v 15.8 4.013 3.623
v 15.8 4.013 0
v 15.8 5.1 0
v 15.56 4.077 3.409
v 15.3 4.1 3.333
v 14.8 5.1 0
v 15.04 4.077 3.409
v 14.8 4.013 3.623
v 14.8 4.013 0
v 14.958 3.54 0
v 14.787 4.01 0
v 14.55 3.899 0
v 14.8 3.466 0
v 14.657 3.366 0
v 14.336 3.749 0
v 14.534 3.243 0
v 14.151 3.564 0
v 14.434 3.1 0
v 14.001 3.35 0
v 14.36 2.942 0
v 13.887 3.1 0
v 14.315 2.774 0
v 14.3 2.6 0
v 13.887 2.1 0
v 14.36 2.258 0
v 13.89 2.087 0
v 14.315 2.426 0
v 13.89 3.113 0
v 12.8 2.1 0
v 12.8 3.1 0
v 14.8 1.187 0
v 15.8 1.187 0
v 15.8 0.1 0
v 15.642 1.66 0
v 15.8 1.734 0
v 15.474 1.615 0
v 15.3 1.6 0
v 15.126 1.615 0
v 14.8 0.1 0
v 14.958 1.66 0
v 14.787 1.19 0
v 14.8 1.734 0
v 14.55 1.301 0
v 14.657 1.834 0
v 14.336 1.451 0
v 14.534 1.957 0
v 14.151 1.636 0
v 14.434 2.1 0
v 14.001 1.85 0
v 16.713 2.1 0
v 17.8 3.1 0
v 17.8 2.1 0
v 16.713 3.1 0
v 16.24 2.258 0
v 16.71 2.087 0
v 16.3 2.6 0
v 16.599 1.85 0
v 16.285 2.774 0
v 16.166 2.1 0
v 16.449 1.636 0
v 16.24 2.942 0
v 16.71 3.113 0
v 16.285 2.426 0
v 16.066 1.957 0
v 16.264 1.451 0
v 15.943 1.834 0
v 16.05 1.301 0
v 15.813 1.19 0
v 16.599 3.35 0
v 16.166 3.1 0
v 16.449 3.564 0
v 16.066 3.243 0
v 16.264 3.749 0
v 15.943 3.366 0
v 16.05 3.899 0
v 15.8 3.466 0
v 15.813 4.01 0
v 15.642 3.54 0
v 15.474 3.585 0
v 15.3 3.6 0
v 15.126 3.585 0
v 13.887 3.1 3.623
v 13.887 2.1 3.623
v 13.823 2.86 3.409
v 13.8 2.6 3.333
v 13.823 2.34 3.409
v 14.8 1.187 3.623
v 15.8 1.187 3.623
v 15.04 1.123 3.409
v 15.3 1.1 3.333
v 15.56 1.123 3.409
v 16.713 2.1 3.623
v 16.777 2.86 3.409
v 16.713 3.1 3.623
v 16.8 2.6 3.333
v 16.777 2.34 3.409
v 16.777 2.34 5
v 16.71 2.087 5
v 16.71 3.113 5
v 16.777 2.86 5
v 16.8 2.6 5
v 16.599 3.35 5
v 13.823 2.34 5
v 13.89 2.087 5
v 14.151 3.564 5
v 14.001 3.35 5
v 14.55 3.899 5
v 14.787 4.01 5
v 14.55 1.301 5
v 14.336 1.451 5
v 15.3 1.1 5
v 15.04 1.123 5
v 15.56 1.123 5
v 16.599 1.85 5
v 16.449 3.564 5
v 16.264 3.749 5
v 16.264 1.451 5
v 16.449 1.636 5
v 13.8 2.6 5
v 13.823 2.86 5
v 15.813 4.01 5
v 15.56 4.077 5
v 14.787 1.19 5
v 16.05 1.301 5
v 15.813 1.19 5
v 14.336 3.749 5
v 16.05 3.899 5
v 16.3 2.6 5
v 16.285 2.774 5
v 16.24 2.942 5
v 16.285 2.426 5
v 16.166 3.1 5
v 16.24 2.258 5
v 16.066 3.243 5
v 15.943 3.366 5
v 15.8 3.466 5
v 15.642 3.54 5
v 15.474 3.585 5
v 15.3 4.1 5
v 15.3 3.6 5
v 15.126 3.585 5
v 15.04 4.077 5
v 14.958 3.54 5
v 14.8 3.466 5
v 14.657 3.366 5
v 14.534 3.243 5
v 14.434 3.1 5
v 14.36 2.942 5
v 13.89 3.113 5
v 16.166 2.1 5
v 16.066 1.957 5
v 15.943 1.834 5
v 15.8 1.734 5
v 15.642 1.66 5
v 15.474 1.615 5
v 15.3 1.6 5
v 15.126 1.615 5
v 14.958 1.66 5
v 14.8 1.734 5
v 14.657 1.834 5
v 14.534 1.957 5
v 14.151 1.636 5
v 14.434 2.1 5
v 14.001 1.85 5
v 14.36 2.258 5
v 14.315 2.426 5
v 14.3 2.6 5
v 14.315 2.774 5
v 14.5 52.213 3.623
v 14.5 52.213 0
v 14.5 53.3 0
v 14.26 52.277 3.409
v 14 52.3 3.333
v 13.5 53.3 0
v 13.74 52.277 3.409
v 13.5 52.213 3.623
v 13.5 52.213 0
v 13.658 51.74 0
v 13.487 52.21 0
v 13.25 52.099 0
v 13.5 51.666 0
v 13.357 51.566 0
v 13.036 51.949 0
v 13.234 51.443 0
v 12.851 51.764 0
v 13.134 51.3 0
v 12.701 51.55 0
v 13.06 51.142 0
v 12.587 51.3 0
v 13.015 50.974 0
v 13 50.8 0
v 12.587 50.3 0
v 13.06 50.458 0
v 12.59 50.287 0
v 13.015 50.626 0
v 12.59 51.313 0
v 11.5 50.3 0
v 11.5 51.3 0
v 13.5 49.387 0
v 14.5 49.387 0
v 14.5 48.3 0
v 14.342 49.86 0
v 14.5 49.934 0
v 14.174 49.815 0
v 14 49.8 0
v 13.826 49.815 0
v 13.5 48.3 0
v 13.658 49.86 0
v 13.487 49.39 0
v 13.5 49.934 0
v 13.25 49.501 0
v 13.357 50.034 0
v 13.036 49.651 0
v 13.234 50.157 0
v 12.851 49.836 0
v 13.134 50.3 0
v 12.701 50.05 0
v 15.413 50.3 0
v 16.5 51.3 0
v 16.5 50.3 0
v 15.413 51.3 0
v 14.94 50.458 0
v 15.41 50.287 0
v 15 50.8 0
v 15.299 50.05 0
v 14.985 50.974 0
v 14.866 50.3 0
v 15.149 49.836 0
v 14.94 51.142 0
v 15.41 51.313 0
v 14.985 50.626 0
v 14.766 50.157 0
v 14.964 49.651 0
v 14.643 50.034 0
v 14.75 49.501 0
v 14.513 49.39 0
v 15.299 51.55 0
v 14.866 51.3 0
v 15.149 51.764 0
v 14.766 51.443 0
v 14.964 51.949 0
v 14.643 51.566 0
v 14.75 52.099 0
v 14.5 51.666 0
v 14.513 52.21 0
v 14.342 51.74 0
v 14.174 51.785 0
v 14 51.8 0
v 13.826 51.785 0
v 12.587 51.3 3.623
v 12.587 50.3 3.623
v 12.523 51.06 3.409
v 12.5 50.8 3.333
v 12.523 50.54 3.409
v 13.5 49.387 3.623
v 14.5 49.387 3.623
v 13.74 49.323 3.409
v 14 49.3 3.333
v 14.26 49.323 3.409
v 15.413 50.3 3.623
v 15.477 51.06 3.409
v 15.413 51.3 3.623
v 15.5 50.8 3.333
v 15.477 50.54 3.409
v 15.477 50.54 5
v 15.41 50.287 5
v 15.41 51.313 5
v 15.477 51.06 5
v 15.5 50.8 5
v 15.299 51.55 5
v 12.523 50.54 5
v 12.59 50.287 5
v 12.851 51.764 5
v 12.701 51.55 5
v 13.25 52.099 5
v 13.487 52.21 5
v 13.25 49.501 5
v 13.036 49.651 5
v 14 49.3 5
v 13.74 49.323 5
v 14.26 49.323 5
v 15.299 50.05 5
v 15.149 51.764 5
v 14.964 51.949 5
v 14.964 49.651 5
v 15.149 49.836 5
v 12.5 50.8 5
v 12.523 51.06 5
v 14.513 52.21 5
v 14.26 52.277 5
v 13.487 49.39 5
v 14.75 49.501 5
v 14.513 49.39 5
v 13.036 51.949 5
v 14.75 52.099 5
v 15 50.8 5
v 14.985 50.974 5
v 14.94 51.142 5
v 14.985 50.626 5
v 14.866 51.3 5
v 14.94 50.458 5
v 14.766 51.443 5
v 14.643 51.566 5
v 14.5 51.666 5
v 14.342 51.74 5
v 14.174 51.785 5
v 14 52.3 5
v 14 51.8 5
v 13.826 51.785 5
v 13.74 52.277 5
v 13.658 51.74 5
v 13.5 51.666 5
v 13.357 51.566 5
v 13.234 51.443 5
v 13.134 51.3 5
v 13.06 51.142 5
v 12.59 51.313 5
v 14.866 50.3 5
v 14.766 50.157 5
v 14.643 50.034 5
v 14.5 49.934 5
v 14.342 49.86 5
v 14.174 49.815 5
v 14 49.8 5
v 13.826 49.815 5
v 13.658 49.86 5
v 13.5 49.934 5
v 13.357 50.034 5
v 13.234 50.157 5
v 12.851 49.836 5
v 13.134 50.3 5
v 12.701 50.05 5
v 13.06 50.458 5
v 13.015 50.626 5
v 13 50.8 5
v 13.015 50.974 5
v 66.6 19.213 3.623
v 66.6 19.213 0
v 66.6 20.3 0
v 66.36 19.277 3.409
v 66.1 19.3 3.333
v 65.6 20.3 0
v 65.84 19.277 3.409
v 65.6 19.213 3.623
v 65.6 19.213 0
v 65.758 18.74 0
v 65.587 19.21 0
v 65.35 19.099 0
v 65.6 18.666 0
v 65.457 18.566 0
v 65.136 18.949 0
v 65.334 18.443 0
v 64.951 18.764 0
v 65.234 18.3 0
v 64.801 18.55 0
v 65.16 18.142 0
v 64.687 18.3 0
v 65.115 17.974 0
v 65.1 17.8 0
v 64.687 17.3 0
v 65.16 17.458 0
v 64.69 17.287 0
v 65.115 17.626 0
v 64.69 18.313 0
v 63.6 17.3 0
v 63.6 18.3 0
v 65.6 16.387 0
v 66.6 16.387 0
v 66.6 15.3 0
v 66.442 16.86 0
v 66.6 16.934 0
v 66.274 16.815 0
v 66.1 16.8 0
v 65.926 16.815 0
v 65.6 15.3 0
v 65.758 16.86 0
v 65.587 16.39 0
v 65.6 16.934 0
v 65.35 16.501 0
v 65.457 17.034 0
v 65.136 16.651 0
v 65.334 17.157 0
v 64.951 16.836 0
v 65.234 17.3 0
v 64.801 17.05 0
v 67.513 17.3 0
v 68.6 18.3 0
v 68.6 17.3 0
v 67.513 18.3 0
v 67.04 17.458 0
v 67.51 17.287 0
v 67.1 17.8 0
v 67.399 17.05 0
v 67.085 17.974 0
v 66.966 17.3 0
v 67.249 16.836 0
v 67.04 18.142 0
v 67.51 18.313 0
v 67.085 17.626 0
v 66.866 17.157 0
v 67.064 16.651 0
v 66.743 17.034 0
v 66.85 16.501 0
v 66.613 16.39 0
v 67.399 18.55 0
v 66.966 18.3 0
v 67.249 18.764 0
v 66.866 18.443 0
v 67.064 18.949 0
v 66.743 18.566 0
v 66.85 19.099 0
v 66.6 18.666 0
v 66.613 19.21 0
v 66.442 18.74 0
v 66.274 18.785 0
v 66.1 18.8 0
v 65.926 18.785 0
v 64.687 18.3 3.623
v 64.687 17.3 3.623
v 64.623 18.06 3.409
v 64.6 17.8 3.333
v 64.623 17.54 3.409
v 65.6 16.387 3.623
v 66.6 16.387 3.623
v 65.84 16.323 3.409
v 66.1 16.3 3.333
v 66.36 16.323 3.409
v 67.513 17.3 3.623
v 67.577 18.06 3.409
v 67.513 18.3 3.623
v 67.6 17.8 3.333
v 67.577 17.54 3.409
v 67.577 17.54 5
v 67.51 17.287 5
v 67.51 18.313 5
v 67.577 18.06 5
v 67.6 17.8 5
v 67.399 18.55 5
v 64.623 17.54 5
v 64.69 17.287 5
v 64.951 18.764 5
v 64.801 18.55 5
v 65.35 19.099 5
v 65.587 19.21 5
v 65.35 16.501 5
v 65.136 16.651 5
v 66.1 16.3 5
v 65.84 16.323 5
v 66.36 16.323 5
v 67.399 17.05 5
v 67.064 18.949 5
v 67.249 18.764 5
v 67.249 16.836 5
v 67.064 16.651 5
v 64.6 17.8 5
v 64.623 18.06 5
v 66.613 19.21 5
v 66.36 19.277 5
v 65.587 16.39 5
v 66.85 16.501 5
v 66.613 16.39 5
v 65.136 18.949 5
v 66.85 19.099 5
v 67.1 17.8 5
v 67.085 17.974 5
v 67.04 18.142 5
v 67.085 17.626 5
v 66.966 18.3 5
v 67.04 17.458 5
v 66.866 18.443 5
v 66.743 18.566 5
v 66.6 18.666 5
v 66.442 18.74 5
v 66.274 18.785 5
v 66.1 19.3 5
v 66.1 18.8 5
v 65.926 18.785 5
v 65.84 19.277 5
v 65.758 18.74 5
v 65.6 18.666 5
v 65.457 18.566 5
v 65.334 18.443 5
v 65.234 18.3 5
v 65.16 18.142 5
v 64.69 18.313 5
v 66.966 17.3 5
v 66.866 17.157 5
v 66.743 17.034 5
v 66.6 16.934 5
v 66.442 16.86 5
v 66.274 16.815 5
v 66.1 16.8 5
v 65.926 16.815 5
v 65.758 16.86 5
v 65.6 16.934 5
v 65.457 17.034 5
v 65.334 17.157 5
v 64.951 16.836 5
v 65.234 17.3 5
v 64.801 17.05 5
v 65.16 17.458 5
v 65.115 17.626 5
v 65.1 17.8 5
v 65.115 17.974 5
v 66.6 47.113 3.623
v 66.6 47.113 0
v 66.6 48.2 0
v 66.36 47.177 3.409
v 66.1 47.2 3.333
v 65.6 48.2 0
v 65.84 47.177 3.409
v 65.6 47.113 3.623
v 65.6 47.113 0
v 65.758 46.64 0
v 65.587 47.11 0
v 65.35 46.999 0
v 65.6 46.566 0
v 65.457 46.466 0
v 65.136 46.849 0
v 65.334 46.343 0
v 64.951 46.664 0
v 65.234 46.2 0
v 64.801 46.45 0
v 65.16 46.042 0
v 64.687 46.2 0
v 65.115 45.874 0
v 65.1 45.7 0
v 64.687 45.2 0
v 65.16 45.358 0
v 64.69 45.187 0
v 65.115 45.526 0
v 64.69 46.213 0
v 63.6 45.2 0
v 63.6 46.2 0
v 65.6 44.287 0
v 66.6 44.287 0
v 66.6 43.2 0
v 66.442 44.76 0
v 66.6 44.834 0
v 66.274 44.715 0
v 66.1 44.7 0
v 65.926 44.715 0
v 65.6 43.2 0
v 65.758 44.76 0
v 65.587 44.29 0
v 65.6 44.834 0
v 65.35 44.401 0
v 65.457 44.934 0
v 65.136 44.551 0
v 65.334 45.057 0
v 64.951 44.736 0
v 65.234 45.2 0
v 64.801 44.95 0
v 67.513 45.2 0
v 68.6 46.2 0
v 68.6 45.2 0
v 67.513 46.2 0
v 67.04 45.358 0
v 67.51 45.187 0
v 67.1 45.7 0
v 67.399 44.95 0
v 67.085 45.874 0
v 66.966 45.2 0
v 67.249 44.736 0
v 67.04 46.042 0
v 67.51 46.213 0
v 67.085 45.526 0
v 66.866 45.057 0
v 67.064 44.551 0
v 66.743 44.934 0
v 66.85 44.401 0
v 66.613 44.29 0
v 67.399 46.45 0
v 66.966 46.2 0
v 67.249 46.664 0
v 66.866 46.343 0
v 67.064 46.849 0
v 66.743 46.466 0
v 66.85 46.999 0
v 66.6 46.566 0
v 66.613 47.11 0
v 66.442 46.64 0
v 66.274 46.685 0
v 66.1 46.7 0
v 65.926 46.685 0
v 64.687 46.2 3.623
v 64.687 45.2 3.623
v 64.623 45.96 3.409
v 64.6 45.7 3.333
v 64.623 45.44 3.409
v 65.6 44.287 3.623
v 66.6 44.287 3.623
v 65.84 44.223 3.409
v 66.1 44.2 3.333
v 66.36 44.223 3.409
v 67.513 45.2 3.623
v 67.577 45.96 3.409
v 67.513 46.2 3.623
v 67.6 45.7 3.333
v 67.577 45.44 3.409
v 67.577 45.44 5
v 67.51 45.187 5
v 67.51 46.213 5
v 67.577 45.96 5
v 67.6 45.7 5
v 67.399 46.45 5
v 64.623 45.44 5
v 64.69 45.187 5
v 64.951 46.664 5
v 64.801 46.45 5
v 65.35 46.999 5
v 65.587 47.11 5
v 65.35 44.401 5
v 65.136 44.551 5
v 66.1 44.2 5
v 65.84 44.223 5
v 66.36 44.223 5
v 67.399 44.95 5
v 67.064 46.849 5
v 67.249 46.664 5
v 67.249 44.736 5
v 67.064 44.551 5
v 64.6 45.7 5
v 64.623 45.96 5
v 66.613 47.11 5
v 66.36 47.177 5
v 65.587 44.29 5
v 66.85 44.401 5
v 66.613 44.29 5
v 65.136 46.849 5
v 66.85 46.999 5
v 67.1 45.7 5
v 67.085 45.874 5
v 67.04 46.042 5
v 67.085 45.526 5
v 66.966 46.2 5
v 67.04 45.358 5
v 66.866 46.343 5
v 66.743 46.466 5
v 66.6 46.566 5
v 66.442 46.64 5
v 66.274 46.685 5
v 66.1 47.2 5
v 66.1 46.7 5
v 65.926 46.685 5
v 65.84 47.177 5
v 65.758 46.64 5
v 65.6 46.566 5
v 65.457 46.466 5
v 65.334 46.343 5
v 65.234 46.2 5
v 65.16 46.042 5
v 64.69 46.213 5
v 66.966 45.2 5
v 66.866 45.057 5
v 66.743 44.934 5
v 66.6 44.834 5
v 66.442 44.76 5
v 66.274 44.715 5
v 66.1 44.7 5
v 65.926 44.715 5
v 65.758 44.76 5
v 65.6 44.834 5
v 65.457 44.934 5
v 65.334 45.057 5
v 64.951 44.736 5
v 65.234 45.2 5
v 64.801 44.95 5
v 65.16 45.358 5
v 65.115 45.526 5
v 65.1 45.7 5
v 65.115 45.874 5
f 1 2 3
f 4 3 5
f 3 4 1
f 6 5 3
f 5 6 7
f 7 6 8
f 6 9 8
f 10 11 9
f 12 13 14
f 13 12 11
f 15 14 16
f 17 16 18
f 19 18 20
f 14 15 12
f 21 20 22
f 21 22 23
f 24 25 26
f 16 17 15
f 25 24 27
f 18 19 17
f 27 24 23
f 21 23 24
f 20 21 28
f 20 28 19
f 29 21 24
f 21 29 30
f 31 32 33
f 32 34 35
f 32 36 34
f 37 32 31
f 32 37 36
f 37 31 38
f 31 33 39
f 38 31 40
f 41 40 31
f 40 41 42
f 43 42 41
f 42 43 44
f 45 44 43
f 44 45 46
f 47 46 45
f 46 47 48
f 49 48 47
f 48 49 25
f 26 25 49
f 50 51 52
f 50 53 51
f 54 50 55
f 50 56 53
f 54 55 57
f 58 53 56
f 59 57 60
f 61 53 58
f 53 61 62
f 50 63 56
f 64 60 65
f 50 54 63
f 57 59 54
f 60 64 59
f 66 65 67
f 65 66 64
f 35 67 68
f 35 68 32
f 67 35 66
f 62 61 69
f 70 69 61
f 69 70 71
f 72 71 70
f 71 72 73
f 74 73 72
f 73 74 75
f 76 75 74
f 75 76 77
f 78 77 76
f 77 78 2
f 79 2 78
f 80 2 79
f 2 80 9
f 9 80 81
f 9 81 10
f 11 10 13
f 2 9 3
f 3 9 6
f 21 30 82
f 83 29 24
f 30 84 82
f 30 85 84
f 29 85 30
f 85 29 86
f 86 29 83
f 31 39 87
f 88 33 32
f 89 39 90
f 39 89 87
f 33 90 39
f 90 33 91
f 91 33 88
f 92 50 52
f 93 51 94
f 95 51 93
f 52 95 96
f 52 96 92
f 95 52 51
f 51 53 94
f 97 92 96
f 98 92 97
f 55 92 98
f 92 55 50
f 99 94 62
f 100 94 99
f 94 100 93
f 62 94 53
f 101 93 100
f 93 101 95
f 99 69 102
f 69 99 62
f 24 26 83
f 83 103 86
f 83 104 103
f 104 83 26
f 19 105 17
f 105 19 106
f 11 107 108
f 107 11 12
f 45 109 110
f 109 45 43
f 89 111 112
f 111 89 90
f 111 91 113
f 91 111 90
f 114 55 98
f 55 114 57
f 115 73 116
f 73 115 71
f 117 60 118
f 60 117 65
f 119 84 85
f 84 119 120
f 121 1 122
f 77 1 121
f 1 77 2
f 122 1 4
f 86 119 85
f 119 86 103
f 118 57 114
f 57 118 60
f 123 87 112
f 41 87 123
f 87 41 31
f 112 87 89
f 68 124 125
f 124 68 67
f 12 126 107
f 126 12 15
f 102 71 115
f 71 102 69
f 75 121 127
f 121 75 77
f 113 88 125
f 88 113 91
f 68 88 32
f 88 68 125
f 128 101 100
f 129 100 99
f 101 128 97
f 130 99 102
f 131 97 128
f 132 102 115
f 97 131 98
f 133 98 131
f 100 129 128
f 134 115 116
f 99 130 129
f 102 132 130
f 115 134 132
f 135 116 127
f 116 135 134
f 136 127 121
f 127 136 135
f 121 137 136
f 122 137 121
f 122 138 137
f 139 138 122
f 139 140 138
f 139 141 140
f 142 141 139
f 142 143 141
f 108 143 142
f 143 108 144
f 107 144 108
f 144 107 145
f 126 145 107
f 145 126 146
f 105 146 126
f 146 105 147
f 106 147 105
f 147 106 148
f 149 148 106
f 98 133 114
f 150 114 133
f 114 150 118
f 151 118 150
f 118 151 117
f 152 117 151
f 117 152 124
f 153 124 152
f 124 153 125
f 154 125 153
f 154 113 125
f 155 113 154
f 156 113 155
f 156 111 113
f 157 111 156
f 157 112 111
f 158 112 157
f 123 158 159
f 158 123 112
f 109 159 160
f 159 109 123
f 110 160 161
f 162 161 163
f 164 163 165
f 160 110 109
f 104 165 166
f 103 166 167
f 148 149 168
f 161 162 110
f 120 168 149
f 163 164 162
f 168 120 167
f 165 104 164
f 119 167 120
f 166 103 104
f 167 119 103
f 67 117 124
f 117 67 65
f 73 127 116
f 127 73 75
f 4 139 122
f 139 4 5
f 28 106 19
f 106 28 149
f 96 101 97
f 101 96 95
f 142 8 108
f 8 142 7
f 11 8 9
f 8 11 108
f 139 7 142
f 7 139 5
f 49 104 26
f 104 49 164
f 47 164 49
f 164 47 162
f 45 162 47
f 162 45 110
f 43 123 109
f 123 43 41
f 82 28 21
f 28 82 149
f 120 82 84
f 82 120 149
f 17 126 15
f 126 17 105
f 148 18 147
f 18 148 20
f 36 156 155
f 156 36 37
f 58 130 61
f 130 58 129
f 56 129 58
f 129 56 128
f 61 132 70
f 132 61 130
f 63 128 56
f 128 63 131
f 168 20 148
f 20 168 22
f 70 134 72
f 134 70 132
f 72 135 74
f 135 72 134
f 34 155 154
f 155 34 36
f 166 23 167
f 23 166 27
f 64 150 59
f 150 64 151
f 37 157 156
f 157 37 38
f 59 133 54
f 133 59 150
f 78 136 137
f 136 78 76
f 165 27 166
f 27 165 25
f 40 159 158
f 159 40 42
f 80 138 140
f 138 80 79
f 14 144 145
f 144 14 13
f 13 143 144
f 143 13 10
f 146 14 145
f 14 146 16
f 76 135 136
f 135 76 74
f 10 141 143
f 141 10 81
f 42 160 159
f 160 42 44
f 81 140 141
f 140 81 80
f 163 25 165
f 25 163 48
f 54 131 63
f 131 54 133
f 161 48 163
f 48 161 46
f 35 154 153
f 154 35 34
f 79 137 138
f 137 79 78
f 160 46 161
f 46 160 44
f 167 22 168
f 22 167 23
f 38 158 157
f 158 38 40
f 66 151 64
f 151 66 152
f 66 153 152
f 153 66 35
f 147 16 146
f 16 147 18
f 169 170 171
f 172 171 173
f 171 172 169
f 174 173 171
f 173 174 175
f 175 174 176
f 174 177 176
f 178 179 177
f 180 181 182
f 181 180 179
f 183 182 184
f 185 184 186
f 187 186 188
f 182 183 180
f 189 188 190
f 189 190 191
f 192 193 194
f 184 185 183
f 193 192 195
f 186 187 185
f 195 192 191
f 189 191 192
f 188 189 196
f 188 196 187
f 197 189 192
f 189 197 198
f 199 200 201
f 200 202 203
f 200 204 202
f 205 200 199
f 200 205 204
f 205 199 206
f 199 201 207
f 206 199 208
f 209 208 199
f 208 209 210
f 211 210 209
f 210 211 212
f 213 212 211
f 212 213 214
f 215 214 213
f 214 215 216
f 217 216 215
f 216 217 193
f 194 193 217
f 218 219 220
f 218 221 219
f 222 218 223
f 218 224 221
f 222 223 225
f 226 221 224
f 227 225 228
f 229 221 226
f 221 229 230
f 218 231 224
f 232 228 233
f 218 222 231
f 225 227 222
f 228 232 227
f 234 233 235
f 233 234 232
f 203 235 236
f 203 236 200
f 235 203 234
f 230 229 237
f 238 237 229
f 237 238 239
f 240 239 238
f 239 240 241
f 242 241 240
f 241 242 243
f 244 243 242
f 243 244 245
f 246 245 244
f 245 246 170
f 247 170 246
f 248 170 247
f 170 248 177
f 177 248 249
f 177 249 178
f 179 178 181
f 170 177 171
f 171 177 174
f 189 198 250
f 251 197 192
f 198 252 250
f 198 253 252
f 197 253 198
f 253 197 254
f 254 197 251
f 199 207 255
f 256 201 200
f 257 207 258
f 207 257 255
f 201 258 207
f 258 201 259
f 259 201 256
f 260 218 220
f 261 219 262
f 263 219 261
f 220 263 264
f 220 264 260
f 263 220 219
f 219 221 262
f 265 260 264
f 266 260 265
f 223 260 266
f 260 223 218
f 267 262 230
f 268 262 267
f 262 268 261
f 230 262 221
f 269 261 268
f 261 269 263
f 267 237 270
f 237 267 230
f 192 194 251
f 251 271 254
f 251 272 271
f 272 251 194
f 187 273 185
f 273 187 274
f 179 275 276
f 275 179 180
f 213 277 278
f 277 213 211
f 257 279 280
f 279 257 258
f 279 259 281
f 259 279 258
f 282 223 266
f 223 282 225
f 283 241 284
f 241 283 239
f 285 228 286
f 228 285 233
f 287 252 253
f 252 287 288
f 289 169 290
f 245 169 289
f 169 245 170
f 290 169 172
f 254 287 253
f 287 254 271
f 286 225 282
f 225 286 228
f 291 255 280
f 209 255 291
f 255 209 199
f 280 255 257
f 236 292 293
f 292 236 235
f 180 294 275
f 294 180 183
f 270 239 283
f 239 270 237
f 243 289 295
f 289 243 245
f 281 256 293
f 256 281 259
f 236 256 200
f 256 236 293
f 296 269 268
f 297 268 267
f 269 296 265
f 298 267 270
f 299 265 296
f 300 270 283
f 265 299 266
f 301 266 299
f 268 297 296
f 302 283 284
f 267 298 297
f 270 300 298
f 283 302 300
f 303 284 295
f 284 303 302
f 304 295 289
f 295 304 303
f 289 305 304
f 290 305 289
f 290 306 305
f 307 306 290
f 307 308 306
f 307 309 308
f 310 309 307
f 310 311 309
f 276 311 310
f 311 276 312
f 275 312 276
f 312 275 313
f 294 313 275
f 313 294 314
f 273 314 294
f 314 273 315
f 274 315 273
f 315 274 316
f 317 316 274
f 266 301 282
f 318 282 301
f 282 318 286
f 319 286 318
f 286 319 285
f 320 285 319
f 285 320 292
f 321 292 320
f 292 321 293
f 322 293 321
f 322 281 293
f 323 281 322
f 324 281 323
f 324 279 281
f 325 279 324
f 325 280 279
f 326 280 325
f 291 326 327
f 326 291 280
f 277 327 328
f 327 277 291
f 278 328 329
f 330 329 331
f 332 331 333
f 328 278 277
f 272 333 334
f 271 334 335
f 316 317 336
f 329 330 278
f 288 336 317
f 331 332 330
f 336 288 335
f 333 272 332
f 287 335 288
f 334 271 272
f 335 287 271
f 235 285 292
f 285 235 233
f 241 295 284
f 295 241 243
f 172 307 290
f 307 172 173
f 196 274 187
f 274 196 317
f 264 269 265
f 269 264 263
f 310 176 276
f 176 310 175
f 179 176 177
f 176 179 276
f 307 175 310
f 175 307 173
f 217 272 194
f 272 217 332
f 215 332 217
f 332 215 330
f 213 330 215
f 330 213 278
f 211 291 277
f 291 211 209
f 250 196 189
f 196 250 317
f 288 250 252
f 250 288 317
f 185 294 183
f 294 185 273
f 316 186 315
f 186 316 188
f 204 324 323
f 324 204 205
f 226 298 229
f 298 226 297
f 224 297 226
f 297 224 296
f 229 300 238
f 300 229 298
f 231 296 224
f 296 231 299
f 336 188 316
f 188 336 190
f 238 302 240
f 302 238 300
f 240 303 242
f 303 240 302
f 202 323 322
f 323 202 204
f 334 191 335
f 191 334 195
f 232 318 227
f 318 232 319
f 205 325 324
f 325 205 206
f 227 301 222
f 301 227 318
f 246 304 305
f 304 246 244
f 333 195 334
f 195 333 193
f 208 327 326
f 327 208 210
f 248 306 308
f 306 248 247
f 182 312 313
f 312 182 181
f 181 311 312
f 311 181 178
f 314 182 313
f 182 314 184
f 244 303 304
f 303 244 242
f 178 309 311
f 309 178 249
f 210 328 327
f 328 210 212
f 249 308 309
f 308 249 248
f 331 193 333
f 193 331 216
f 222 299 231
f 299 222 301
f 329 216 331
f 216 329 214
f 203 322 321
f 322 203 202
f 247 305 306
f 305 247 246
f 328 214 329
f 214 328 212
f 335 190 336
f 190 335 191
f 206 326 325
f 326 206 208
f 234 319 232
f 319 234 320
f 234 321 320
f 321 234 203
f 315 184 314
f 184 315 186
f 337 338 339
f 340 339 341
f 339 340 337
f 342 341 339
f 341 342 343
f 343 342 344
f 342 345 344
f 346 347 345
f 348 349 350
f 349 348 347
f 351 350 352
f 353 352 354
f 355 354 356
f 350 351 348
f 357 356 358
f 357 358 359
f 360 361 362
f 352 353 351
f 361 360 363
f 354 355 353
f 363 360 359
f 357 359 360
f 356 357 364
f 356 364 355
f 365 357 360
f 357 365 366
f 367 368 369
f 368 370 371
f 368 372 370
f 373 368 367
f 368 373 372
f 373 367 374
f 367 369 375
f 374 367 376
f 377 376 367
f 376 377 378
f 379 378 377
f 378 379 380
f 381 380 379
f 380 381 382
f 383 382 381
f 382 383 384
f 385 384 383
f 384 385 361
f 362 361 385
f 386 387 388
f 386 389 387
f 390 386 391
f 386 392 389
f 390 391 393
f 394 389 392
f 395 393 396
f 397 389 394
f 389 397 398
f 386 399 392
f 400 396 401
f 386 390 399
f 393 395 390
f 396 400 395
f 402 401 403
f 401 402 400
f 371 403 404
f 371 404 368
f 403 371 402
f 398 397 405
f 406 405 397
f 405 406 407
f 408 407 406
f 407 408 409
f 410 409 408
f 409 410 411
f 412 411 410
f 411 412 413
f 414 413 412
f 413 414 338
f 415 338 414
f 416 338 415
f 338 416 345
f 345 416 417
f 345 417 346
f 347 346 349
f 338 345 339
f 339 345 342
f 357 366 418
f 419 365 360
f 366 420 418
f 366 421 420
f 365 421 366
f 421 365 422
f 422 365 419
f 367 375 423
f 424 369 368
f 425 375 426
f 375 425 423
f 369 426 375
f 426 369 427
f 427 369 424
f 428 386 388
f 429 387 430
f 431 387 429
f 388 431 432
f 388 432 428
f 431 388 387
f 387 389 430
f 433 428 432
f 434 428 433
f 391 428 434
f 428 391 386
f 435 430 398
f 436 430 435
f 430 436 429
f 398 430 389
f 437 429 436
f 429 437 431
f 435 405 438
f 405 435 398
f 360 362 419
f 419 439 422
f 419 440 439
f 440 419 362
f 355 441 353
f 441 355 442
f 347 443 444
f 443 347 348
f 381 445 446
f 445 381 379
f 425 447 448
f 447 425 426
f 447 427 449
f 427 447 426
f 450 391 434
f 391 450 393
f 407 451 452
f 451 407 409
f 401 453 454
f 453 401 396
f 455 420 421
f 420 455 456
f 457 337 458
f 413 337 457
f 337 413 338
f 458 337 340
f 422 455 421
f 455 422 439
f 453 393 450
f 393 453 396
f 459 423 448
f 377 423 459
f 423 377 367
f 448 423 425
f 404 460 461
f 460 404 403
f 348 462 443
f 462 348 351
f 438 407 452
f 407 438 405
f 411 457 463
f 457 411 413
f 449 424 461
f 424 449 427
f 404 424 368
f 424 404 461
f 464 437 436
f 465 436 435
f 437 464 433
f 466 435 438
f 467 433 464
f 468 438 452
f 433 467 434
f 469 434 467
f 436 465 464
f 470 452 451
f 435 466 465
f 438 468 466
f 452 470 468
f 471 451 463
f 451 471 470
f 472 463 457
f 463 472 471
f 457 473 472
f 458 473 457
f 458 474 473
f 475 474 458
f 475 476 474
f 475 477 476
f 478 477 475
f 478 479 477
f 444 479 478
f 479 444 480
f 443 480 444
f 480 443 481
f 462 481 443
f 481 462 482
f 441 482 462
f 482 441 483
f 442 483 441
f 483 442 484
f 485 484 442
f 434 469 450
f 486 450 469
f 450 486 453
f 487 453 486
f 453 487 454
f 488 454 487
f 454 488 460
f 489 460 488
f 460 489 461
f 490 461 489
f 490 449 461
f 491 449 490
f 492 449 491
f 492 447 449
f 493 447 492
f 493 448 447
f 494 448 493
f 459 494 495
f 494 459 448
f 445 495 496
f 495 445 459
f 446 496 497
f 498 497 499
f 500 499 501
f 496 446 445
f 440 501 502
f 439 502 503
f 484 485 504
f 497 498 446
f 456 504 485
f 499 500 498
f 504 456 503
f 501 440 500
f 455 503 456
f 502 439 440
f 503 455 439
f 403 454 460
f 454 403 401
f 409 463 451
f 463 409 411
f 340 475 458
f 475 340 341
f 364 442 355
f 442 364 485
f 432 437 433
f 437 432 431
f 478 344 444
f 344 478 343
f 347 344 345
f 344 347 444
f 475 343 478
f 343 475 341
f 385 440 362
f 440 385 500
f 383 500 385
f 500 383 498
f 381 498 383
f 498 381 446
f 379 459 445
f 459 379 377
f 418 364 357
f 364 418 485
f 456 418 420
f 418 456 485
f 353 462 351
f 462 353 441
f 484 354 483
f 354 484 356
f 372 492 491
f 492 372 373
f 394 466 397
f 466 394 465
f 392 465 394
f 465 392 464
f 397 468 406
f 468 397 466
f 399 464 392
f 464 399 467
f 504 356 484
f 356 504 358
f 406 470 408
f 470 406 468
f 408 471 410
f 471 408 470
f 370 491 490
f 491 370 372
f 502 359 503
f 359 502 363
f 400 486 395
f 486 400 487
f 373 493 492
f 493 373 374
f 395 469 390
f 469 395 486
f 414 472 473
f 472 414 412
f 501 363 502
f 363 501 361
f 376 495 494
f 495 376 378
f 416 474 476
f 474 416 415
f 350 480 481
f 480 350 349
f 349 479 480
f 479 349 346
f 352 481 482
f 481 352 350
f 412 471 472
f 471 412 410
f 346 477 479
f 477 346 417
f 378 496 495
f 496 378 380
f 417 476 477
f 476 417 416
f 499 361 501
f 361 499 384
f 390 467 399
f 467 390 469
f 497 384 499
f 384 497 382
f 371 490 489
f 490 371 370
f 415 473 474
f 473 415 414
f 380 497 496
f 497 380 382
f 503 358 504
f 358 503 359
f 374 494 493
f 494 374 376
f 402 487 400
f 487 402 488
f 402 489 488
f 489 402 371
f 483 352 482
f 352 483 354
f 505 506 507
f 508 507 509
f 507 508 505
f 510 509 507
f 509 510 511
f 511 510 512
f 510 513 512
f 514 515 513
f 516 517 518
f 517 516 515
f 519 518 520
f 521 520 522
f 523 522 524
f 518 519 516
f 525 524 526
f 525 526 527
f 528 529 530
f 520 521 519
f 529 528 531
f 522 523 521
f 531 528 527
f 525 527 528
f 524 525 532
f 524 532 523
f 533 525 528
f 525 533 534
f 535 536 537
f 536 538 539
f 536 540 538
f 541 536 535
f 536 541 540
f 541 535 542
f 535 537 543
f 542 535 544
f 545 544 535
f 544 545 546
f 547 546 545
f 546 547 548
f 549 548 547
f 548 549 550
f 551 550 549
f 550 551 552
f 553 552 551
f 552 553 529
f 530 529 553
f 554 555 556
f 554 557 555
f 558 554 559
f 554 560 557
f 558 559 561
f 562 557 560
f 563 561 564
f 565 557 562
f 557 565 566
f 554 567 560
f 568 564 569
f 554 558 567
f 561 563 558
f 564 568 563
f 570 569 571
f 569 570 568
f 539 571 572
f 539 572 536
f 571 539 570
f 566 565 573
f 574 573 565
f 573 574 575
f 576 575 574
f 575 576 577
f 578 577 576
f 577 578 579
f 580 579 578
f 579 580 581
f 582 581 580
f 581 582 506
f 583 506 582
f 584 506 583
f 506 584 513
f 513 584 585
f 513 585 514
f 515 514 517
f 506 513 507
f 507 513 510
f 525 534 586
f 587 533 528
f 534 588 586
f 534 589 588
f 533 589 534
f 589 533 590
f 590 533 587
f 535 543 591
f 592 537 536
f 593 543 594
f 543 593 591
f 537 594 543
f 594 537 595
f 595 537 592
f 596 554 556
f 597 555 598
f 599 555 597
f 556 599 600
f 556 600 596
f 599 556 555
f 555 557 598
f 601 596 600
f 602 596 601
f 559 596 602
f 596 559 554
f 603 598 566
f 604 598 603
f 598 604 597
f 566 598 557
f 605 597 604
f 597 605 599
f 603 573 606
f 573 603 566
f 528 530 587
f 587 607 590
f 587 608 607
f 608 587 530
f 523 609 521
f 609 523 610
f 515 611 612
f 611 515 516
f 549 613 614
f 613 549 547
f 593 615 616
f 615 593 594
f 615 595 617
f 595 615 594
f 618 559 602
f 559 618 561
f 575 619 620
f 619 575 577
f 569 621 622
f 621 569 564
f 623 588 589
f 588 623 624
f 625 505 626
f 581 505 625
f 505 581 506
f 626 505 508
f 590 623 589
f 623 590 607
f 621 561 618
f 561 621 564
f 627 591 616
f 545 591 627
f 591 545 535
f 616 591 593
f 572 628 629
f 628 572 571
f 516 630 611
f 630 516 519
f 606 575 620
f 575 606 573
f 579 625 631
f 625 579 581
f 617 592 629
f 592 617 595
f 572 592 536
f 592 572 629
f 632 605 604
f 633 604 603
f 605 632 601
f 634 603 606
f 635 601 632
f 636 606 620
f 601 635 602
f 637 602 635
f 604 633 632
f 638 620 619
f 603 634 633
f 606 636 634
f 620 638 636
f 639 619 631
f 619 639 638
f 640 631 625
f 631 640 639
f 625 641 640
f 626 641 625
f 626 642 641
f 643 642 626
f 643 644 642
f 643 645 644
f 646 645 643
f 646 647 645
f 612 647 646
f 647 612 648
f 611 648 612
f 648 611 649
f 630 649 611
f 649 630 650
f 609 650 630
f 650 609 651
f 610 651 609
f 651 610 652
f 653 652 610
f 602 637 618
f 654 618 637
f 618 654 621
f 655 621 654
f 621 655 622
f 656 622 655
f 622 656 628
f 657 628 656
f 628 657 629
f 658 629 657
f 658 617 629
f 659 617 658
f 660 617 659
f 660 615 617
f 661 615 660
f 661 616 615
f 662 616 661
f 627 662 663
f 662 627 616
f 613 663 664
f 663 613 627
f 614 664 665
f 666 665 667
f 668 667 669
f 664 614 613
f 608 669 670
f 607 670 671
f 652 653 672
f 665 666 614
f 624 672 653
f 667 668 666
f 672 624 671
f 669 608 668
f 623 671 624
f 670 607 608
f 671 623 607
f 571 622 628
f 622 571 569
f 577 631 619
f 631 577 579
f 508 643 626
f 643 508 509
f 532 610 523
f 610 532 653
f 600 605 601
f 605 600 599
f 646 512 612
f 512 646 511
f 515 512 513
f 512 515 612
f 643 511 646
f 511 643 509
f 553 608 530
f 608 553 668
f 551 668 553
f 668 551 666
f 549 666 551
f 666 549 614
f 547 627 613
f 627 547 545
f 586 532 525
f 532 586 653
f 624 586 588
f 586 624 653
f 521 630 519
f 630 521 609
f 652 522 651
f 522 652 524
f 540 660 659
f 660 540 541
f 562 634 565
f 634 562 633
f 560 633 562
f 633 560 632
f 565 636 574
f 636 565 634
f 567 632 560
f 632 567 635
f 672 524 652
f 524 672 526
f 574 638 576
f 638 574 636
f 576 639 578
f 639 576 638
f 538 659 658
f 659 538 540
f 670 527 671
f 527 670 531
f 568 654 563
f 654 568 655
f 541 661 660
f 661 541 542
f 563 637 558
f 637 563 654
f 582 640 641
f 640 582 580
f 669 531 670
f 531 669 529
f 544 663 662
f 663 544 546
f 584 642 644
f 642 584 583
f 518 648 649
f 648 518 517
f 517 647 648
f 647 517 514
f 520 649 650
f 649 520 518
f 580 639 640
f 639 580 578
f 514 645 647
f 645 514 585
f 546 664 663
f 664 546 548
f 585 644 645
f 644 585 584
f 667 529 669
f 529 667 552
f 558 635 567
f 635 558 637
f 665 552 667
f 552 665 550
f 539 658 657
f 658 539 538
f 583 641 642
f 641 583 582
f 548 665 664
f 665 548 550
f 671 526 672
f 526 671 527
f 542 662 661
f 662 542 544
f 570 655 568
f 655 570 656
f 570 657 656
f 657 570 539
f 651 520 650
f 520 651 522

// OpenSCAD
// file: posts.scad
/* Developed by Alex Grutter */

$fn = 36;

four_posts_with_supports(10, 3, 2, 25, 50, 5, 1, [0,0,0,0], 1, true);

module four_posts(post_height, post_outer_diameter, post_inner_diameter, post_spacing_width, post_spacing_length){
    difference()
    {
		/* Outer part */
		union()
		{
            translate([0, 0, 0])
            {
                cylinder(h = post_height, d = post_outer_diameter);
            }
            translate([0, post_spacing_length + 0, 0])
            {
                cylinder(h = post_height, d = post_outer_diameter);
            }
            translate([post_spacing_width + 0, 0, 0])
            {
                cylinder(h = post_height, d = post_outer_diameter);
            }
            translate([post_spacing_width + 0, post_spacing_length + 0, 0])
            {
                cylinder(h = post_height, d = post_outer_diameter);
            }
		}
		/* Inner hole */
        union()
        {
            translate([0, 0, -1])
            {
                cylinder(h = post_height+2, d = post_inner_diameter);
            }
            translate([0, post_spacing_length + 0, -1])
            {
                cylinder(h = post_height+2, d = post_inner_diameter);
            }
            translate([post_spacing_width + 0, 0, -1])
            {
                cylinder(h = post_height+2, d = post_inner_diameter);
            }
            translate([post_spacing_width + 0, post_spacing_length + 0, -1])
            {
                cylinder(h = post_height+2, d = post_inner_diameter);
            }
        }
	}
};

module four_posts_with_supports(post_height, post_outer_diameter, post_inner_diameter, post_spacing_width, post_spacing_length, support_diameter, support_count, support_start_angle, support_thickness, flip){
    difference()
    {
		/* Outer part */
		union()
		{
            translate([0, 0, 0])
            {
                cylinder(h = post_height, d = post_outer_diameter);
				for(support = [0 : support_count])
				{
					if(flip)
					{
						translate([0, 0, post_height])
						rotate([support_start_angle[0] + ( support * (360 / support_count)),90,0])
						translate([0, 0, -(support_thickness / 2)])
						linear_extrude(support_thickness)
						polygon([[post_height, (post_inner_diameter / 2)],[0, (post_inner_diameter / 2)],[0,(support_diameter / 2)]], [[0,1,2]]);
					}
					else
					{
						rotate([support_start_angle[0] + ( support * (360 / support_count)),-90,0])
						translate([0, 0, -(support_thickness / 2)])
						linear_extrude(support_thickness)
						polygon([[post_height, (post_inner_diameter / 2)],[0, (post_inner_diameter / 2)],[0, (support_diameter / 2)]], [[0,1,2]]);
					}
				}
            }
            translate([0, post_spacing_length + 0, 0])
            {
                cylinder(h = post_height, d = post_outer_diameter);
				for(support = [0 : support_count])
				{
					if(flip)
					{
						translate([0, 0, post_height])
						rotate([support_start_angle[1] + ( support * (360 / support_count)),90,0])
						translate([0, 0, -(support_thickness / 2)])
						linear_extrude(support_thickness)
						polygon([[post_height, (post_inner_diameter / 2)],[0, (post_inner_diameter / 2)],[0,(support_diameter / 2)]], [[0,1,2]]);
					}
					else
					{
						rotate([support_start_angle[1] + ( support * (360 / support_count)),-90,0])
						translate([0, 0, -(support_thickness / 2)])
						linear_extrude(support_thickness)
						polygon([[post_height, (post_inner_diameter / 2)],[0, (post_inner_diameter / 2)],[0,(support_diameter / 2)]], [[0,1,2]]);
					}
				}
            }
            translate([post_spacing_width + 0, 0, 0])
            {
                cylinder(h = post_height, d = post_outer_diameter);
				for(support = [0 : support_count])
				{
					if(flip)
					{
						translate([0, 0, post_height])
						rotate([support_start_angle[2] + ( support * (360 / support_count)),90,0])
						translate([0, 0, -(support_thickness / 2)])
						linear_extrude(support_thickness)
						polygon([[post_height, (post_inner_diameter / 2)],[0, (post_inner_diameter / 2)],[0,(support_diameter / 2)]], [[0,1,2]]);
					}
					else
					{
						rotate([support_start_angle[2] + ( support * (360 / support_count)),-90,0])
						translate([0, 0, -(support_thickness / 2)])
						linear_extrude(support_thickness)
						polygon([[post_height, (post_inner_diameter / 2)],[0, (post_inner_diameter / 2)],[0,(support_diameter / 2)]], [[0,1,2]]);
					}
				}
            }
            translate([post_spacing_width + 0, post_spacing_length + 0, 0])
            {
                cylinder(h = post_height, d = post_outer_diameter);
				for(support = [0 : support_count])
				{
					if(flip)
					{
						translate([0, 0, post_height])
						rotate([support_start_angle[3] + ( support * (360 / support_count)),90,0])
						translate([0, 0, -(support_thickness / 2)])
						linear_extrude(support_thickness)
						polygon([[post_height, (post_inner_diameter / 2)],[0, (post_inner_diameter / 2)],[0,(support_diameter / 2)]], [[0,1,2]]);
					}
					else
					{
						rotate([support_start_angle[3] + ( support * (360 / support_count)),-90,0])
						translate([0, 0, -(support_thickness / 2)])
						linear_extrude(support_thickness)
						polygon([[post_height, (post_inner_diameter / 2)],[0, (post_inner_diameter / 2)],[0,(support_diameter / 2)]], [[0,1,2]]);
					}
				}
            }
		}
        
		/* Inner hole */
        union()
        {
            translate([0, 0, -1])
            {
                cylinder(h = post_height+2, d = post_inner_diameter);
            }
            translate([0, post_spacing_length + 0, -1])
            {
                cylinder(h = post_height+2, d = post_inner_diameter);
            }
            translate([post_spacing_width + 0, 0, -1])
            {
                cylinder(h = post_height+2, d = post_inner_diameter);
            }
            translate([post_spacing_width + 0, post_spacing_length + 0, -1])
            {
                cylinder(h = post_height+2, d = post_inner_diameter);
            }
        }
	}
};
// main file
use <posts.scad>

TOP                             = true;
BOTTOM                          = false;

/* Examples for viewing */
arduino_uno_posts(TOP);

module arduino_uno_posts(top = false)
{
    /* Post parameters */
    post_height                 = 5;
    post_outer_diameter         = 3;
    post_inner_diameter         = 2;
    
    /* Post support parameters */
    support_diameter            = 5;
    support_count               = 4;
    support_start_angle         = [0,0,0,0];
    support_thickness           = 1;
    support_flip                = false;
    
    /* Length positioning parameters */
    hole1_offset_length         = 14.0 + 1.3;
    hole2_offset_length         = 14.0;
    hole3_offset_length         = 14.0 + 1.3 + 50.8;
    hole4_offset_length         = hole3_offset_length;
    
    /* Width positioning parameters */
    hole1_offset_width          = 2.5 + 5.1 + 27.9 + 15.2;
    hole2_offset_width          = 2.5;
    hole3_offset_width          = 2.5 + 5.1 + 27.9;
    hole4_offset_width          = 2.5 + 5.1;
    
    board_width                 = 53.3;

    if(top)
    {
        /* Hole 1: */
        translate([hole1_offset_length, board_width - hole1_offset_width, 0])
        four_posts_with_supports(post_height, post_outer_diameter, post_inner_diameter, 0, 0, support_diameter, support_count, support_start_angle, support_thickness, support_flip);
        
        /* Hole 2: */
        translate([hole2_offset_length, board_width - hole2_offset_width, 0])
        four_posts_with_supports(post_height, post_outer_diameter, post_inner_diameter, 0, 0, support_diameter, support_count, support_start_angle, support_thickness, support_flip);
            
        /* Hole 3: */
        translate([hole3_offset_length, board_width - hole3_offset_width, 0])
        four_posts_with_supports(post_height, post_outer_diameter, post_inner_diameter, 0, 0, support_diameter, support_count, support_start_angle, support_thickness, support_flip);
        
        /* Hole 4: */
        translate([hole4_offset_length, board_width - hole4_offset_width, 0])
        four_posts_with_supports(post_height, post_outer_diameter, post_inner_diameter, 0, 0, support_diameter, support_count, support_start_angle, support_thickness, support_flip);
    }
    else
    {
        /* Hole 1: */
        translate([hole1_offset_length, hole1_offset_width, 0])
        four_posts_with_supports(post_height, post_outer_diameter, post_inner_diameter, 0, 0, support_diameter, support_count, support_start_angle, support_thickness, support_flip);
        
        /* Hole 2: */
        translate([hole2_offset_length, hole2_offset_width, 0])
        four_posts_with_supports(post_height, post_outer_diameter, post_inner_diameter, 0, 0, support_diameter, support_count, support_start_angle, support_thickness, support_flip);
            
        /* Hole 3: */
        translate([hole3_offset_length, hole3_offset_width, 0])
        four_posts_with_supports(post_height, post_outer_diameter, post_inner_diameter, 0, 0, support_diameter, support_count, support_start_angle, support_thickness, support_flip);
        
        /* Hole 4: */
        translate([hole4_offset_length, hole4_offset_width, 0])
        four_posts_with_supports(post_height, post_outer_diameter, post_inner_diameter, 0, 0, support_diameter, support_count, support_start_angle, support_thickness, support_flip);
    }
}
